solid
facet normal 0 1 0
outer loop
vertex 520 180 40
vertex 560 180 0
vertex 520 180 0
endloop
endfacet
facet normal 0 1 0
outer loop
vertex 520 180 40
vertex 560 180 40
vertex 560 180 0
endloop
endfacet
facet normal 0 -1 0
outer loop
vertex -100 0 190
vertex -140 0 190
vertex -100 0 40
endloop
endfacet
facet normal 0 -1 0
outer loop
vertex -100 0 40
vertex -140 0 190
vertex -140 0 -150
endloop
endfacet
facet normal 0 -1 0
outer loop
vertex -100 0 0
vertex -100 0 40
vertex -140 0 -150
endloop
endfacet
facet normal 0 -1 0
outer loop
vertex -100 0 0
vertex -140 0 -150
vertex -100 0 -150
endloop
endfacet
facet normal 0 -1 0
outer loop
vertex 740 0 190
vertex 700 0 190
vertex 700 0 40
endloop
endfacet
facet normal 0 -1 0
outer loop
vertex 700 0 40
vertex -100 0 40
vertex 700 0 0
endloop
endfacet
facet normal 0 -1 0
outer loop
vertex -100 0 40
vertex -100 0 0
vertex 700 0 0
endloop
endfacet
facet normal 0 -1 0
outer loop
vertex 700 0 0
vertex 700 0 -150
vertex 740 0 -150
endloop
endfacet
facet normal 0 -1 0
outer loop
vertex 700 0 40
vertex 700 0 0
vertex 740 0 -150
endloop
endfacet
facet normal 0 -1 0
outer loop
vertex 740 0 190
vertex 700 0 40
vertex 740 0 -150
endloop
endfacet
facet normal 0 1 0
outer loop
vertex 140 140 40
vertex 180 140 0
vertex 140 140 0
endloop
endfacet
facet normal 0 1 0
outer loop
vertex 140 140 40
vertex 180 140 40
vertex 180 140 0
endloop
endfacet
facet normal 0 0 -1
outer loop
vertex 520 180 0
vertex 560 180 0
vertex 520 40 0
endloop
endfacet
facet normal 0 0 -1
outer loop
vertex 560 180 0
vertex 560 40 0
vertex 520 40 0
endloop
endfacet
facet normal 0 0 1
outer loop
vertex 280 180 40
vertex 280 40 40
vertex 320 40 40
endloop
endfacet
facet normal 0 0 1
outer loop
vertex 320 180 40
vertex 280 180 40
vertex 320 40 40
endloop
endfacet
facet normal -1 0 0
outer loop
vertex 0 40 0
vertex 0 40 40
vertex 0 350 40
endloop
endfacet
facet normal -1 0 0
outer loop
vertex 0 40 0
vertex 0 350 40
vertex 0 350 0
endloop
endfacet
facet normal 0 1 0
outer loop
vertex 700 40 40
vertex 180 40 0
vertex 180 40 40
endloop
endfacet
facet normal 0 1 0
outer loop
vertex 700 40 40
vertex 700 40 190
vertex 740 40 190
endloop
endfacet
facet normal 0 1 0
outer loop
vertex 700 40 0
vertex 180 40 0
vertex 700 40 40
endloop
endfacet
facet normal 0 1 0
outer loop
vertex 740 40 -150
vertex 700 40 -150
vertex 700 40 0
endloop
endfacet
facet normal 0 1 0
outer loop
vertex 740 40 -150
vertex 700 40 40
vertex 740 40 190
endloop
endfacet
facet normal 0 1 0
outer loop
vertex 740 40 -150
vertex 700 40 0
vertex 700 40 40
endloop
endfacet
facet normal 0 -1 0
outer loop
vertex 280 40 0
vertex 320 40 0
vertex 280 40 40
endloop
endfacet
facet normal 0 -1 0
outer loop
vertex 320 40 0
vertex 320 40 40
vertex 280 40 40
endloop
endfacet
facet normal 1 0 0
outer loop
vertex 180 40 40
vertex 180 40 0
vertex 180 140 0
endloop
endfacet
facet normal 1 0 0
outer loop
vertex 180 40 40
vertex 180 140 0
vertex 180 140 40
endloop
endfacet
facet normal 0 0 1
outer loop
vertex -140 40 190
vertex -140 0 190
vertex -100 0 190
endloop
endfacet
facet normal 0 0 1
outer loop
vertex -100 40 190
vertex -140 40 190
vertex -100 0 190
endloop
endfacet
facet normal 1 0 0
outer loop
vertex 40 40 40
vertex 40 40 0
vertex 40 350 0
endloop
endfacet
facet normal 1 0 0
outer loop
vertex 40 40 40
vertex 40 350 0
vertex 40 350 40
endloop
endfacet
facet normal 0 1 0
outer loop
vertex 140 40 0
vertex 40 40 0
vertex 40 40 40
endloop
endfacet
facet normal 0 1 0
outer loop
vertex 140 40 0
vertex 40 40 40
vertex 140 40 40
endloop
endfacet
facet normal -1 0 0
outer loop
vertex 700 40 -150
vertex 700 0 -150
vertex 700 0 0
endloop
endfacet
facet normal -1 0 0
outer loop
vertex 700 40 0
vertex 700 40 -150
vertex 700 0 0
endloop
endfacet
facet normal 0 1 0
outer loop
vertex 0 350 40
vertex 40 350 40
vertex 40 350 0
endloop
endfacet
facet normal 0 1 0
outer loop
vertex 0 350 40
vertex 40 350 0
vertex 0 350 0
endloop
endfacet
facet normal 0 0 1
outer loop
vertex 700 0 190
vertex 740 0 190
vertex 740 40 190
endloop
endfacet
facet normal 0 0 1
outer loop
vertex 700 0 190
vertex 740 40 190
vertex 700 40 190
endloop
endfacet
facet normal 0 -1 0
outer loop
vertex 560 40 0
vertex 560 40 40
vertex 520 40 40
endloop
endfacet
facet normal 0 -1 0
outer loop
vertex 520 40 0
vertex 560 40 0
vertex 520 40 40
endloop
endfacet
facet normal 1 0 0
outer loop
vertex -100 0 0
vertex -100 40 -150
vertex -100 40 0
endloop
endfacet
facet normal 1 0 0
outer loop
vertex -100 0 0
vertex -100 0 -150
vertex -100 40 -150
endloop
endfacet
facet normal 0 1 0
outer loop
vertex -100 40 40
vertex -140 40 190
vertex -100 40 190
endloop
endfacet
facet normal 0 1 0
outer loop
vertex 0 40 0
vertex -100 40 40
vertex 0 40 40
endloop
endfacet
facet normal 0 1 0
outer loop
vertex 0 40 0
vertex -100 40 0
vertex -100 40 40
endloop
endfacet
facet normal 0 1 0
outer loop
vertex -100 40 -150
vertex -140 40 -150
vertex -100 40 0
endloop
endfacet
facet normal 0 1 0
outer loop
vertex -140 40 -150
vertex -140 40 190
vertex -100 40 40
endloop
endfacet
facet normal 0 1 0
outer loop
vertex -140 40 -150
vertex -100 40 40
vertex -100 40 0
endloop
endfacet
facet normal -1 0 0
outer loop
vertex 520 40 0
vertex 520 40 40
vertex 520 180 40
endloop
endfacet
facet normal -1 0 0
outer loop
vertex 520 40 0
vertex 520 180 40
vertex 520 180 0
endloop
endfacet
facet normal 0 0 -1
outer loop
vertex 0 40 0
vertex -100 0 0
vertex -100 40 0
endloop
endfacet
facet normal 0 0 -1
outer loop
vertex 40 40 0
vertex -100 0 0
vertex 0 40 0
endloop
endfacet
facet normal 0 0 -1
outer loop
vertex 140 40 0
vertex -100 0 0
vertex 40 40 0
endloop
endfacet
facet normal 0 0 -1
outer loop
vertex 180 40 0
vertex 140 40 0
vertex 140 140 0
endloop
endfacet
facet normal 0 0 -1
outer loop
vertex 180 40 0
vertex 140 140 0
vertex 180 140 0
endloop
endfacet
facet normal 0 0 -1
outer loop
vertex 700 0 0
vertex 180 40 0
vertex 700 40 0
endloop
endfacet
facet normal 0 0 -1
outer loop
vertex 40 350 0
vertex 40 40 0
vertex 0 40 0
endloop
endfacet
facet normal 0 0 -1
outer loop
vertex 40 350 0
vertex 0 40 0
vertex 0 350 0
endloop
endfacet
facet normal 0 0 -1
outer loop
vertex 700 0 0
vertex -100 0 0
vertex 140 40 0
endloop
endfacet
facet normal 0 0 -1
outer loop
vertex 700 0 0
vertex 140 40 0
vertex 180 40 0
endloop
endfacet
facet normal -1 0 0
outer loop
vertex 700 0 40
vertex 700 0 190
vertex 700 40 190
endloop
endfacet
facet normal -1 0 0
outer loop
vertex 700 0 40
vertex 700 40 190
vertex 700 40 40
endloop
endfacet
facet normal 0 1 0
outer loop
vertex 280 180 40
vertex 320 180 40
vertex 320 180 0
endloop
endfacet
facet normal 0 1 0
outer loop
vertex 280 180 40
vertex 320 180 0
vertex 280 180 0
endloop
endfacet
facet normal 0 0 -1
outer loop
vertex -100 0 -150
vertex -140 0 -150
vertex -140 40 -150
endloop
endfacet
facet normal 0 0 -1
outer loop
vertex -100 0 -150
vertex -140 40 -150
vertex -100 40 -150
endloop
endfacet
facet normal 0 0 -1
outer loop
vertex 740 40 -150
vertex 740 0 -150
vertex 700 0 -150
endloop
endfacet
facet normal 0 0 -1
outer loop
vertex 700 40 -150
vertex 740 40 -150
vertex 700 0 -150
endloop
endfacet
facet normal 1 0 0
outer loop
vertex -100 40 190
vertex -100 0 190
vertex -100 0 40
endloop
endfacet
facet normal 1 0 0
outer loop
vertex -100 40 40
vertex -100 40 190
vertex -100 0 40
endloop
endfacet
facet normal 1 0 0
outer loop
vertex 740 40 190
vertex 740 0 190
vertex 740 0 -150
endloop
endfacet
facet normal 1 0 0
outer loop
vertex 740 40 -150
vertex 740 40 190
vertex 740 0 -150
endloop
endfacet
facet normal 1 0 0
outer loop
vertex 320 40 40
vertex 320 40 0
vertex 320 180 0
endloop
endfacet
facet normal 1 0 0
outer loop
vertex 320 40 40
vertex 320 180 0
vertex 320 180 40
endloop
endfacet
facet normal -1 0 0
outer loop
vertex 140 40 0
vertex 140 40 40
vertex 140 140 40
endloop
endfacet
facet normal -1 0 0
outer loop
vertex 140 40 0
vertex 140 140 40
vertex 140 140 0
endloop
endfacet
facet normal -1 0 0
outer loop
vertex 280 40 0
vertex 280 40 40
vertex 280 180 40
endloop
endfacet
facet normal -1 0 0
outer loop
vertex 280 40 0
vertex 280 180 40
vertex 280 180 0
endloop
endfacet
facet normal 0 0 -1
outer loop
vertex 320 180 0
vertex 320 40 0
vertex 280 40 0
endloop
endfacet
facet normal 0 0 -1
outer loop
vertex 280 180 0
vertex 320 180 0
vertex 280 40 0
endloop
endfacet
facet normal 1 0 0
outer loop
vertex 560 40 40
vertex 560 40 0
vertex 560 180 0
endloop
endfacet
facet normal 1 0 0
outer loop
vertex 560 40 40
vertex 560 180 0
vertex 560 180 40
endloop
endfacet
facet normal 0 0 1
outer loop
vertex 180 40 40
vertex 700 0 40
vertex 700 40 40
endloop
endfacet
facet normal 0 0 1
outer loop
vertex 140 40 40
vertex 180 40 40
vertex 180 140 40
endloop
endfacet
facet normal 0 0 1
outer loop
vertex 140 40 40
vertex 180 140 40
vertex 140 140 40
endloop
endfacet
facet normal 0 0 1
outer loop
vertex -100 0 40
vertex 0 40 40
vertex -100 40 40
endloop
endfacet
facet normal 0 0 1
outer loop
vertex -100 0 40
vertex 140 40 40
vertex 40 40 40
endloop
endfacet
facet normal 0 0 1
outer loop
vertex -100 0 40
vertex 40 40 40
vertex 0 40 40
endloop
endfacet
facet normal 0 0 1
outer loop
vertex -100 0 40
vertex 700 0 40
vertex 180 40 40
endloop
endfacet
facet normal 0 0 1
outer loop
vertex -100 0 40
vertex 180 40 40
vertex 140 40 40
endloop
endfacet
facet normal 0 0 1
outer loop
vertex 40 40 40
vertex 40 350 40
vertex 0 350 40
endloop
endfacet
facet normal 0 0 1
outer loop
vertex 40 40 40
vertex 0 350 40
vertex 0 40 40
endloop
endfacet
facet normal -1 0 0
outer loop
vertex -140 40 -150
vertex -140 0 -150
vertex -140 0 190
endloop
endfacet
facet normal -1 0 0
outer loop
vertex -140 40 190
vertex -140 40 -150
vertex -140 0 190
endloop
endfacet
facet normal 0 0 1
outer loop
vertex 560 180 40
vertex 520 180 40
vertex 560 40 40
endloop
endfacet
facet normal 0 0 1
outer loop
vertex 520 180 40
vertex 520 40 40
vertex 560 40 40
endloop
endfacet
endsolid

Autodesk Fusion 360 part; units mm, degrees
sketch "Eskiz1" plane through (0, 0, 0) normal (0, 1, 0) x (1, 0, 0)
  line L0 (0, 0) -> (600, 0)
  line L1 (600, 0) -> (600, -40)
  line L2 (600, -40) -> (0, -40)
  line L3 (0, -40) -> (0, 0)
  line L4 (0, 0) -> (-100, 0)
  line L5 (-100, 0) -> (-100, -40)
  line L6 (-100, -40) -> (0, -40)
  line L7 (0, -40) -> (0, 0)
  line L8 (-100, 0) -> (-140, 0)
  line L9 (-140, 0) -> (-140, -190)
  line L10 (-140, -190) -> (-100, -190)
  line L11 (-100, -190) -> (-100, 0)
  line L12 (-100, -40) -> (-140, -40)
  line L13 (-140, -40) -> (-140, 150)
  line L14 (-140, 150) -> (-100, 150)
  line L15 (-100, 150) -> (-100, -40)
  line L16 (740, 0) -> (740, -190)
  line L17 (700, 0) -> (600, 0)
  line L18 (740, -40) -> (740, 150)
  line L19 (600, -40) -> (700, -40)
  line L20 (700, -190) -> (700, 0)
  line L21 (740, -190) -> (700, -190)
  line L22 (700, -40) -> (700, 0)
  line L23 (740, 150) -> (700, 150)
  line L24 (700, -40) -> (740, -40)
  line L25 (700, 0) -> (740, 0)
  line L26 (700, 150) -> (700, -40)
  dimension "d1" = 600
  dimension "d2" = 40
  dimension "d24" = 100
  dimension "d25" = 40
  dimension "d26" = 40
  dimension "d27" = 190
  dimension "d28" = 40
  dimension "d29" = 190
  dimension "d30" = 100
  dimension "d31" = 40
  dimension "d32" = 40
  dimension "d33" = 190
  dimension "d34" = 40
  dimension "d35" = 190
extrude "Ekstrüde Et1" add sketch "Eskiz1" along normal blind 40 contours L0 L1 L2 L3 L7 makes body 1
sketch "Eskiz2" plane through (0, 40, 0) normal (0, 1, 0) x (-1, 0, 0)
  line L0 (0, 40) -> (-600, 40)
  line L1 (-600, 40) -> (-600, 0)
  line L2 (-600, 0) -> (0, 0)
  line L3 (0, 0) -> (0, 40)
  line L4 (0, 0) -> (-40, 0)
  line L5 (-40, 0) -> (-40, 40)
  line L6 (-40, 40) -> (0, 40)
  line L7 (0, 40) -> (0, 0)
  line L8 (-280, 0) -> (-320, 0)
  line L9 (-320, 0) -> (-320, 40)
  line L10 (-320, 40) -> (-280, 40)
  line L11 (-280, 40) -> (-280, 0)
  line L12 (-520, 0) -> (-560, 0)
  line L13 (-560, 0) -> (-560, 40)
  line L14 (-560, 40) -> (-520, 40)
  line L15 (-520, 40) -> (-520, 0)
  line L16 (-140, 0) -> (-180, 0)
  line L17 (-180, 0) -> (-180, 40)
  line L18 (-180, 40) -> (-140, 40)
  line L19 (-140, 40) -> (-140, 0)
  dimension "d5" = 40
  dimension "d6" = 40
  dimension "d7" = 40
  dimension "d8" = 40
  dimension "d9" = 40
  dimension "d16" = 40
  dimension "d17" = 40
  dimension "d20" = 40
  dimension "d21" = 100
  dimension "d22" = 100
  dimension "d23" = 200
extrude "Ekstrüde Et2" add sketch "Eskiz2" along normal blind 140 separate body contours L0 L2 L8 L9 L10 L11 | L0 L2 L12 L13 L14 L15 makes body 2 at (280, 86.6667, 26.6667) makes body 3 at (520, 86.6667, 26.6667)
extrude "Ekstrüde Et3" add sketch "Eskiz2" along normal blind 310 contours L0 L2 L3 L4 L5 L6 L7 bodies 1
extrude "Ekstrüde Et4" add sketch "Eskiz1" along normal blind 40 contours L3 L4 L5 L6 L7 L11 L15 | L1 L17 L19 L20 L22 L26 | L5 L8 L9 L11 L12 L13 L15 | L8 L13 L14 L15 | L16 L18 L20 L22 L24 L25 L26 | L18 L23 L25 L26 | L9 L10 L11 L12 | L16 L20 L21 L24 bodies 1
extrude "Ekstrüde Et5" add sketch "Eskiz2" along normal blind 100 contours L0 L2 L16 L17 L18 L19 bodies 1
